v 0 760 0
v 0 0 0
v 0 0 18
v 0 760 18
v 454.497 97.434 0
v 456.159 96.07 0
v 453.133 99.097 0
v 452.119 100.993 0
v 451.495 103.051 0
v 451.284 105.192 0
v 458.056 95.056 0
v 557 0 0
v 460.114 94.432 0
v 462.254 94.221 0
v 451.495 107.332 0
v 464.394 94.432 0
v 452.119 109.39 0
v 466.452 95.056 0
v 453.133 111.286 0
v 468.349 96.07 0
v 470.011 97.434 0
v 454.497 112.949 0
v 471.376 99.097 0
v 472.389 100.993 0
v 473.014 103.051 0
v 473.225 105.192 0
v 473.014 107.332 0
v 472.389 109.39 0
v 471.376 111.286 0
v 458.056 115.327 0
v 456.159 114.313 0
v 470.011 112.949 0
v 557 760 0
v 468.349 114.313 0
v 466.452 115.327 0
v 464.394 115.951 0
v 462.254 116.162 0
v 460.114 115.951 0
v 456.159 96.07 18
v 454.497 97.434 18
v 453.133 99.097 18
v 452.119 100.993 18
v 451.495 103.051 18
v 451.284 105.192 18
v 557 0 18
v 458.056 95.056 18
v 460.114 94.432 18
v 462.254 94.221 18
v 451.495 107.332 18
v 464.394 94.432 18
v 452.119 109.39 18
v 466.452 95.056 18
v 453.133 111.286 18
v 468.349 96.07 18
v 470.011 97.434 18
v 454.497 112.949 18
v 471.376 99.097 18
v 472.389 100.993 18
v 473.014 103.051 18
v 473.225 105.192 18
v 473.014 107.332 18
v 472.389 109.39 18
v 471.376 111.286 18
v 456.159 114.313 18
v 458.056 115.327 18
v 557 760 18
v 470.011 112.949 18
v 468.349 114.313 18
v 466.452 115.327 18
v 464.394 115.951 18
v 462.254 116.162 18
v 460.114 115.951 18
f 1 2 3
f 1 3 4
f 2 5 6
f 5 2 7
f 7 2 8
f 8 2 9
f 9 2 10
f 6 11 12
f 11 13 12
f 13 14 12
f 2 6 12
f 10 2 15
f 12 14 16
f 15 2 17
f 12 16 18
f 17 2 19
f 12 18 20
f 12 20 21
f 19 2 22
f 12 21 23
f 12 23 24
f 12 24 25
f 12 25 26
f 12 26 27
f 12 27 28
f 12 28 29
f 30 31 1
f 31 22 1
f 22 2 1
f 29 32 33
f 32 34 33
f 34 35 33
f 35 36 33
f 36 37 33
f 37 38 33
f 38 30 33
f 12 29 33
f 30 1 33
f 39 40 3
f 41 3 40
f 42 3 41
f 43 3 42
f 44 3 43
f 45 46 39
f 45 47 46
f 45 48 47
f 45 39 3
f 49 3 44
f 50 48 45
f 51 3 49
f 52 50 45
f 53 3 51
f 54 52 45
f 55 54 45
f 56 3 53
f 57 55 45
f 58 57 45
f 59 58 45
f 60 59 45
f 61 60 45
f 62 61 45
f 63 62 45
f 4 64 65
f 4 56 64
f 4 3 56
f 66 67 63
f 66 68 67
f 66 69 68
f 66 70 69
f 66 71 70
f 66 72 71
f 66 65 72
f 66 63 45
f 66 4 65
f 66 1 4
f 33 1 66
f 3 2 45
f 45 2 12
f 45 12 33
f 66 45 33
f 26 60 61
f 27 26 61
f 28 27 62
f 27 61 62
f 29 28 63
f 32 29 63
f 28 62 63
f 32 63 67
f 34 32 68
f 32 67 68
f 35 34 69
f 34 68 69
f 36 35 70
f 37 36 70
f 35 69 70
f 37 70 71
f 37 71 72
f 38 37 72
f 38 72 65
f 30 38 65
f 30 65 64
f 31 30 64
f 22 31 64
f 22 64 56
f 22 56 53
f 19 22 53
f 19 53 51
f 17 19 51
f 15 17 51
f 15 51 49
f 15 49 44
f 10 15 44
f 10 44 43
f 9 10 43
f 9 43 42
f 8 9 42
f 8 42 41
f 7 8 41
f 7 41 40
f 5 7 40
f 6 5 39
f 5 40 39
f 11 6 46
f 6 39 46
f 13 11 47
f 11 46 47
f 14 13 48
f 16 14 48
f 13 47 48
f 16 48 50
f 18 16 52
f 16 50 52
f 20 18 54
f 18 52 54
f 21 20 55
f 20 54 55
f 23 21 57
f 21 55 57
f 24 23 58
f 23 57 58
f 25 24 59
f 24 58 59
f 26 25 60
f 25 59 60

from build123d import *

# Parameters (mm, degrees)
SZKIC1_W                    = 557
SZKIC1_H                    = 760
DODANIE_WYCI_GNI_CIE1_DEPTH = 18
WYTNIJ_WYCI_GNI_CIE1_REACH  = 944.429
SZKIC2_R                    = 10.970397566


with BuildPart() as part:
    # Szkic1 → Dodanie-wyciągnięcie1 (new body)
    with BuildSketch(Plane.XY):
        with Locations((278.5, 380)):
            Rectangle(SZKIC1_W, SZKIC1_H)
    extrude(amount=DODANIE_WYCI_GNI_CIE1_DEPTH)

    # Szkic2 → Wytnij-wyciągnięcie1 (cut, up to next)
    with BuildSketch(Plane.XY.offset(18), mode=Mode.PRIVATE) as wytnij_wyci_gni_cie1_sk1:
        with Locations((462.25415923, 105.191540972)):
            Circle(SZKIC2_R)
    wytnij_wyci_gni_cie1_tool1 = extrude(wytnij_wyci_gni_cie1_sk1.sketch, amount=-WYTNIJ_WYCI_GNI_CIE1_REACH, mode=Mode.PRIVATE) & part.part
    add(wytnij_wyci_gni_cie1_tool1.solids().sort_by_distance((462.254159, 105.191541, 18))[0], mode=Mode.SUBTRACT)


solid = part.part
